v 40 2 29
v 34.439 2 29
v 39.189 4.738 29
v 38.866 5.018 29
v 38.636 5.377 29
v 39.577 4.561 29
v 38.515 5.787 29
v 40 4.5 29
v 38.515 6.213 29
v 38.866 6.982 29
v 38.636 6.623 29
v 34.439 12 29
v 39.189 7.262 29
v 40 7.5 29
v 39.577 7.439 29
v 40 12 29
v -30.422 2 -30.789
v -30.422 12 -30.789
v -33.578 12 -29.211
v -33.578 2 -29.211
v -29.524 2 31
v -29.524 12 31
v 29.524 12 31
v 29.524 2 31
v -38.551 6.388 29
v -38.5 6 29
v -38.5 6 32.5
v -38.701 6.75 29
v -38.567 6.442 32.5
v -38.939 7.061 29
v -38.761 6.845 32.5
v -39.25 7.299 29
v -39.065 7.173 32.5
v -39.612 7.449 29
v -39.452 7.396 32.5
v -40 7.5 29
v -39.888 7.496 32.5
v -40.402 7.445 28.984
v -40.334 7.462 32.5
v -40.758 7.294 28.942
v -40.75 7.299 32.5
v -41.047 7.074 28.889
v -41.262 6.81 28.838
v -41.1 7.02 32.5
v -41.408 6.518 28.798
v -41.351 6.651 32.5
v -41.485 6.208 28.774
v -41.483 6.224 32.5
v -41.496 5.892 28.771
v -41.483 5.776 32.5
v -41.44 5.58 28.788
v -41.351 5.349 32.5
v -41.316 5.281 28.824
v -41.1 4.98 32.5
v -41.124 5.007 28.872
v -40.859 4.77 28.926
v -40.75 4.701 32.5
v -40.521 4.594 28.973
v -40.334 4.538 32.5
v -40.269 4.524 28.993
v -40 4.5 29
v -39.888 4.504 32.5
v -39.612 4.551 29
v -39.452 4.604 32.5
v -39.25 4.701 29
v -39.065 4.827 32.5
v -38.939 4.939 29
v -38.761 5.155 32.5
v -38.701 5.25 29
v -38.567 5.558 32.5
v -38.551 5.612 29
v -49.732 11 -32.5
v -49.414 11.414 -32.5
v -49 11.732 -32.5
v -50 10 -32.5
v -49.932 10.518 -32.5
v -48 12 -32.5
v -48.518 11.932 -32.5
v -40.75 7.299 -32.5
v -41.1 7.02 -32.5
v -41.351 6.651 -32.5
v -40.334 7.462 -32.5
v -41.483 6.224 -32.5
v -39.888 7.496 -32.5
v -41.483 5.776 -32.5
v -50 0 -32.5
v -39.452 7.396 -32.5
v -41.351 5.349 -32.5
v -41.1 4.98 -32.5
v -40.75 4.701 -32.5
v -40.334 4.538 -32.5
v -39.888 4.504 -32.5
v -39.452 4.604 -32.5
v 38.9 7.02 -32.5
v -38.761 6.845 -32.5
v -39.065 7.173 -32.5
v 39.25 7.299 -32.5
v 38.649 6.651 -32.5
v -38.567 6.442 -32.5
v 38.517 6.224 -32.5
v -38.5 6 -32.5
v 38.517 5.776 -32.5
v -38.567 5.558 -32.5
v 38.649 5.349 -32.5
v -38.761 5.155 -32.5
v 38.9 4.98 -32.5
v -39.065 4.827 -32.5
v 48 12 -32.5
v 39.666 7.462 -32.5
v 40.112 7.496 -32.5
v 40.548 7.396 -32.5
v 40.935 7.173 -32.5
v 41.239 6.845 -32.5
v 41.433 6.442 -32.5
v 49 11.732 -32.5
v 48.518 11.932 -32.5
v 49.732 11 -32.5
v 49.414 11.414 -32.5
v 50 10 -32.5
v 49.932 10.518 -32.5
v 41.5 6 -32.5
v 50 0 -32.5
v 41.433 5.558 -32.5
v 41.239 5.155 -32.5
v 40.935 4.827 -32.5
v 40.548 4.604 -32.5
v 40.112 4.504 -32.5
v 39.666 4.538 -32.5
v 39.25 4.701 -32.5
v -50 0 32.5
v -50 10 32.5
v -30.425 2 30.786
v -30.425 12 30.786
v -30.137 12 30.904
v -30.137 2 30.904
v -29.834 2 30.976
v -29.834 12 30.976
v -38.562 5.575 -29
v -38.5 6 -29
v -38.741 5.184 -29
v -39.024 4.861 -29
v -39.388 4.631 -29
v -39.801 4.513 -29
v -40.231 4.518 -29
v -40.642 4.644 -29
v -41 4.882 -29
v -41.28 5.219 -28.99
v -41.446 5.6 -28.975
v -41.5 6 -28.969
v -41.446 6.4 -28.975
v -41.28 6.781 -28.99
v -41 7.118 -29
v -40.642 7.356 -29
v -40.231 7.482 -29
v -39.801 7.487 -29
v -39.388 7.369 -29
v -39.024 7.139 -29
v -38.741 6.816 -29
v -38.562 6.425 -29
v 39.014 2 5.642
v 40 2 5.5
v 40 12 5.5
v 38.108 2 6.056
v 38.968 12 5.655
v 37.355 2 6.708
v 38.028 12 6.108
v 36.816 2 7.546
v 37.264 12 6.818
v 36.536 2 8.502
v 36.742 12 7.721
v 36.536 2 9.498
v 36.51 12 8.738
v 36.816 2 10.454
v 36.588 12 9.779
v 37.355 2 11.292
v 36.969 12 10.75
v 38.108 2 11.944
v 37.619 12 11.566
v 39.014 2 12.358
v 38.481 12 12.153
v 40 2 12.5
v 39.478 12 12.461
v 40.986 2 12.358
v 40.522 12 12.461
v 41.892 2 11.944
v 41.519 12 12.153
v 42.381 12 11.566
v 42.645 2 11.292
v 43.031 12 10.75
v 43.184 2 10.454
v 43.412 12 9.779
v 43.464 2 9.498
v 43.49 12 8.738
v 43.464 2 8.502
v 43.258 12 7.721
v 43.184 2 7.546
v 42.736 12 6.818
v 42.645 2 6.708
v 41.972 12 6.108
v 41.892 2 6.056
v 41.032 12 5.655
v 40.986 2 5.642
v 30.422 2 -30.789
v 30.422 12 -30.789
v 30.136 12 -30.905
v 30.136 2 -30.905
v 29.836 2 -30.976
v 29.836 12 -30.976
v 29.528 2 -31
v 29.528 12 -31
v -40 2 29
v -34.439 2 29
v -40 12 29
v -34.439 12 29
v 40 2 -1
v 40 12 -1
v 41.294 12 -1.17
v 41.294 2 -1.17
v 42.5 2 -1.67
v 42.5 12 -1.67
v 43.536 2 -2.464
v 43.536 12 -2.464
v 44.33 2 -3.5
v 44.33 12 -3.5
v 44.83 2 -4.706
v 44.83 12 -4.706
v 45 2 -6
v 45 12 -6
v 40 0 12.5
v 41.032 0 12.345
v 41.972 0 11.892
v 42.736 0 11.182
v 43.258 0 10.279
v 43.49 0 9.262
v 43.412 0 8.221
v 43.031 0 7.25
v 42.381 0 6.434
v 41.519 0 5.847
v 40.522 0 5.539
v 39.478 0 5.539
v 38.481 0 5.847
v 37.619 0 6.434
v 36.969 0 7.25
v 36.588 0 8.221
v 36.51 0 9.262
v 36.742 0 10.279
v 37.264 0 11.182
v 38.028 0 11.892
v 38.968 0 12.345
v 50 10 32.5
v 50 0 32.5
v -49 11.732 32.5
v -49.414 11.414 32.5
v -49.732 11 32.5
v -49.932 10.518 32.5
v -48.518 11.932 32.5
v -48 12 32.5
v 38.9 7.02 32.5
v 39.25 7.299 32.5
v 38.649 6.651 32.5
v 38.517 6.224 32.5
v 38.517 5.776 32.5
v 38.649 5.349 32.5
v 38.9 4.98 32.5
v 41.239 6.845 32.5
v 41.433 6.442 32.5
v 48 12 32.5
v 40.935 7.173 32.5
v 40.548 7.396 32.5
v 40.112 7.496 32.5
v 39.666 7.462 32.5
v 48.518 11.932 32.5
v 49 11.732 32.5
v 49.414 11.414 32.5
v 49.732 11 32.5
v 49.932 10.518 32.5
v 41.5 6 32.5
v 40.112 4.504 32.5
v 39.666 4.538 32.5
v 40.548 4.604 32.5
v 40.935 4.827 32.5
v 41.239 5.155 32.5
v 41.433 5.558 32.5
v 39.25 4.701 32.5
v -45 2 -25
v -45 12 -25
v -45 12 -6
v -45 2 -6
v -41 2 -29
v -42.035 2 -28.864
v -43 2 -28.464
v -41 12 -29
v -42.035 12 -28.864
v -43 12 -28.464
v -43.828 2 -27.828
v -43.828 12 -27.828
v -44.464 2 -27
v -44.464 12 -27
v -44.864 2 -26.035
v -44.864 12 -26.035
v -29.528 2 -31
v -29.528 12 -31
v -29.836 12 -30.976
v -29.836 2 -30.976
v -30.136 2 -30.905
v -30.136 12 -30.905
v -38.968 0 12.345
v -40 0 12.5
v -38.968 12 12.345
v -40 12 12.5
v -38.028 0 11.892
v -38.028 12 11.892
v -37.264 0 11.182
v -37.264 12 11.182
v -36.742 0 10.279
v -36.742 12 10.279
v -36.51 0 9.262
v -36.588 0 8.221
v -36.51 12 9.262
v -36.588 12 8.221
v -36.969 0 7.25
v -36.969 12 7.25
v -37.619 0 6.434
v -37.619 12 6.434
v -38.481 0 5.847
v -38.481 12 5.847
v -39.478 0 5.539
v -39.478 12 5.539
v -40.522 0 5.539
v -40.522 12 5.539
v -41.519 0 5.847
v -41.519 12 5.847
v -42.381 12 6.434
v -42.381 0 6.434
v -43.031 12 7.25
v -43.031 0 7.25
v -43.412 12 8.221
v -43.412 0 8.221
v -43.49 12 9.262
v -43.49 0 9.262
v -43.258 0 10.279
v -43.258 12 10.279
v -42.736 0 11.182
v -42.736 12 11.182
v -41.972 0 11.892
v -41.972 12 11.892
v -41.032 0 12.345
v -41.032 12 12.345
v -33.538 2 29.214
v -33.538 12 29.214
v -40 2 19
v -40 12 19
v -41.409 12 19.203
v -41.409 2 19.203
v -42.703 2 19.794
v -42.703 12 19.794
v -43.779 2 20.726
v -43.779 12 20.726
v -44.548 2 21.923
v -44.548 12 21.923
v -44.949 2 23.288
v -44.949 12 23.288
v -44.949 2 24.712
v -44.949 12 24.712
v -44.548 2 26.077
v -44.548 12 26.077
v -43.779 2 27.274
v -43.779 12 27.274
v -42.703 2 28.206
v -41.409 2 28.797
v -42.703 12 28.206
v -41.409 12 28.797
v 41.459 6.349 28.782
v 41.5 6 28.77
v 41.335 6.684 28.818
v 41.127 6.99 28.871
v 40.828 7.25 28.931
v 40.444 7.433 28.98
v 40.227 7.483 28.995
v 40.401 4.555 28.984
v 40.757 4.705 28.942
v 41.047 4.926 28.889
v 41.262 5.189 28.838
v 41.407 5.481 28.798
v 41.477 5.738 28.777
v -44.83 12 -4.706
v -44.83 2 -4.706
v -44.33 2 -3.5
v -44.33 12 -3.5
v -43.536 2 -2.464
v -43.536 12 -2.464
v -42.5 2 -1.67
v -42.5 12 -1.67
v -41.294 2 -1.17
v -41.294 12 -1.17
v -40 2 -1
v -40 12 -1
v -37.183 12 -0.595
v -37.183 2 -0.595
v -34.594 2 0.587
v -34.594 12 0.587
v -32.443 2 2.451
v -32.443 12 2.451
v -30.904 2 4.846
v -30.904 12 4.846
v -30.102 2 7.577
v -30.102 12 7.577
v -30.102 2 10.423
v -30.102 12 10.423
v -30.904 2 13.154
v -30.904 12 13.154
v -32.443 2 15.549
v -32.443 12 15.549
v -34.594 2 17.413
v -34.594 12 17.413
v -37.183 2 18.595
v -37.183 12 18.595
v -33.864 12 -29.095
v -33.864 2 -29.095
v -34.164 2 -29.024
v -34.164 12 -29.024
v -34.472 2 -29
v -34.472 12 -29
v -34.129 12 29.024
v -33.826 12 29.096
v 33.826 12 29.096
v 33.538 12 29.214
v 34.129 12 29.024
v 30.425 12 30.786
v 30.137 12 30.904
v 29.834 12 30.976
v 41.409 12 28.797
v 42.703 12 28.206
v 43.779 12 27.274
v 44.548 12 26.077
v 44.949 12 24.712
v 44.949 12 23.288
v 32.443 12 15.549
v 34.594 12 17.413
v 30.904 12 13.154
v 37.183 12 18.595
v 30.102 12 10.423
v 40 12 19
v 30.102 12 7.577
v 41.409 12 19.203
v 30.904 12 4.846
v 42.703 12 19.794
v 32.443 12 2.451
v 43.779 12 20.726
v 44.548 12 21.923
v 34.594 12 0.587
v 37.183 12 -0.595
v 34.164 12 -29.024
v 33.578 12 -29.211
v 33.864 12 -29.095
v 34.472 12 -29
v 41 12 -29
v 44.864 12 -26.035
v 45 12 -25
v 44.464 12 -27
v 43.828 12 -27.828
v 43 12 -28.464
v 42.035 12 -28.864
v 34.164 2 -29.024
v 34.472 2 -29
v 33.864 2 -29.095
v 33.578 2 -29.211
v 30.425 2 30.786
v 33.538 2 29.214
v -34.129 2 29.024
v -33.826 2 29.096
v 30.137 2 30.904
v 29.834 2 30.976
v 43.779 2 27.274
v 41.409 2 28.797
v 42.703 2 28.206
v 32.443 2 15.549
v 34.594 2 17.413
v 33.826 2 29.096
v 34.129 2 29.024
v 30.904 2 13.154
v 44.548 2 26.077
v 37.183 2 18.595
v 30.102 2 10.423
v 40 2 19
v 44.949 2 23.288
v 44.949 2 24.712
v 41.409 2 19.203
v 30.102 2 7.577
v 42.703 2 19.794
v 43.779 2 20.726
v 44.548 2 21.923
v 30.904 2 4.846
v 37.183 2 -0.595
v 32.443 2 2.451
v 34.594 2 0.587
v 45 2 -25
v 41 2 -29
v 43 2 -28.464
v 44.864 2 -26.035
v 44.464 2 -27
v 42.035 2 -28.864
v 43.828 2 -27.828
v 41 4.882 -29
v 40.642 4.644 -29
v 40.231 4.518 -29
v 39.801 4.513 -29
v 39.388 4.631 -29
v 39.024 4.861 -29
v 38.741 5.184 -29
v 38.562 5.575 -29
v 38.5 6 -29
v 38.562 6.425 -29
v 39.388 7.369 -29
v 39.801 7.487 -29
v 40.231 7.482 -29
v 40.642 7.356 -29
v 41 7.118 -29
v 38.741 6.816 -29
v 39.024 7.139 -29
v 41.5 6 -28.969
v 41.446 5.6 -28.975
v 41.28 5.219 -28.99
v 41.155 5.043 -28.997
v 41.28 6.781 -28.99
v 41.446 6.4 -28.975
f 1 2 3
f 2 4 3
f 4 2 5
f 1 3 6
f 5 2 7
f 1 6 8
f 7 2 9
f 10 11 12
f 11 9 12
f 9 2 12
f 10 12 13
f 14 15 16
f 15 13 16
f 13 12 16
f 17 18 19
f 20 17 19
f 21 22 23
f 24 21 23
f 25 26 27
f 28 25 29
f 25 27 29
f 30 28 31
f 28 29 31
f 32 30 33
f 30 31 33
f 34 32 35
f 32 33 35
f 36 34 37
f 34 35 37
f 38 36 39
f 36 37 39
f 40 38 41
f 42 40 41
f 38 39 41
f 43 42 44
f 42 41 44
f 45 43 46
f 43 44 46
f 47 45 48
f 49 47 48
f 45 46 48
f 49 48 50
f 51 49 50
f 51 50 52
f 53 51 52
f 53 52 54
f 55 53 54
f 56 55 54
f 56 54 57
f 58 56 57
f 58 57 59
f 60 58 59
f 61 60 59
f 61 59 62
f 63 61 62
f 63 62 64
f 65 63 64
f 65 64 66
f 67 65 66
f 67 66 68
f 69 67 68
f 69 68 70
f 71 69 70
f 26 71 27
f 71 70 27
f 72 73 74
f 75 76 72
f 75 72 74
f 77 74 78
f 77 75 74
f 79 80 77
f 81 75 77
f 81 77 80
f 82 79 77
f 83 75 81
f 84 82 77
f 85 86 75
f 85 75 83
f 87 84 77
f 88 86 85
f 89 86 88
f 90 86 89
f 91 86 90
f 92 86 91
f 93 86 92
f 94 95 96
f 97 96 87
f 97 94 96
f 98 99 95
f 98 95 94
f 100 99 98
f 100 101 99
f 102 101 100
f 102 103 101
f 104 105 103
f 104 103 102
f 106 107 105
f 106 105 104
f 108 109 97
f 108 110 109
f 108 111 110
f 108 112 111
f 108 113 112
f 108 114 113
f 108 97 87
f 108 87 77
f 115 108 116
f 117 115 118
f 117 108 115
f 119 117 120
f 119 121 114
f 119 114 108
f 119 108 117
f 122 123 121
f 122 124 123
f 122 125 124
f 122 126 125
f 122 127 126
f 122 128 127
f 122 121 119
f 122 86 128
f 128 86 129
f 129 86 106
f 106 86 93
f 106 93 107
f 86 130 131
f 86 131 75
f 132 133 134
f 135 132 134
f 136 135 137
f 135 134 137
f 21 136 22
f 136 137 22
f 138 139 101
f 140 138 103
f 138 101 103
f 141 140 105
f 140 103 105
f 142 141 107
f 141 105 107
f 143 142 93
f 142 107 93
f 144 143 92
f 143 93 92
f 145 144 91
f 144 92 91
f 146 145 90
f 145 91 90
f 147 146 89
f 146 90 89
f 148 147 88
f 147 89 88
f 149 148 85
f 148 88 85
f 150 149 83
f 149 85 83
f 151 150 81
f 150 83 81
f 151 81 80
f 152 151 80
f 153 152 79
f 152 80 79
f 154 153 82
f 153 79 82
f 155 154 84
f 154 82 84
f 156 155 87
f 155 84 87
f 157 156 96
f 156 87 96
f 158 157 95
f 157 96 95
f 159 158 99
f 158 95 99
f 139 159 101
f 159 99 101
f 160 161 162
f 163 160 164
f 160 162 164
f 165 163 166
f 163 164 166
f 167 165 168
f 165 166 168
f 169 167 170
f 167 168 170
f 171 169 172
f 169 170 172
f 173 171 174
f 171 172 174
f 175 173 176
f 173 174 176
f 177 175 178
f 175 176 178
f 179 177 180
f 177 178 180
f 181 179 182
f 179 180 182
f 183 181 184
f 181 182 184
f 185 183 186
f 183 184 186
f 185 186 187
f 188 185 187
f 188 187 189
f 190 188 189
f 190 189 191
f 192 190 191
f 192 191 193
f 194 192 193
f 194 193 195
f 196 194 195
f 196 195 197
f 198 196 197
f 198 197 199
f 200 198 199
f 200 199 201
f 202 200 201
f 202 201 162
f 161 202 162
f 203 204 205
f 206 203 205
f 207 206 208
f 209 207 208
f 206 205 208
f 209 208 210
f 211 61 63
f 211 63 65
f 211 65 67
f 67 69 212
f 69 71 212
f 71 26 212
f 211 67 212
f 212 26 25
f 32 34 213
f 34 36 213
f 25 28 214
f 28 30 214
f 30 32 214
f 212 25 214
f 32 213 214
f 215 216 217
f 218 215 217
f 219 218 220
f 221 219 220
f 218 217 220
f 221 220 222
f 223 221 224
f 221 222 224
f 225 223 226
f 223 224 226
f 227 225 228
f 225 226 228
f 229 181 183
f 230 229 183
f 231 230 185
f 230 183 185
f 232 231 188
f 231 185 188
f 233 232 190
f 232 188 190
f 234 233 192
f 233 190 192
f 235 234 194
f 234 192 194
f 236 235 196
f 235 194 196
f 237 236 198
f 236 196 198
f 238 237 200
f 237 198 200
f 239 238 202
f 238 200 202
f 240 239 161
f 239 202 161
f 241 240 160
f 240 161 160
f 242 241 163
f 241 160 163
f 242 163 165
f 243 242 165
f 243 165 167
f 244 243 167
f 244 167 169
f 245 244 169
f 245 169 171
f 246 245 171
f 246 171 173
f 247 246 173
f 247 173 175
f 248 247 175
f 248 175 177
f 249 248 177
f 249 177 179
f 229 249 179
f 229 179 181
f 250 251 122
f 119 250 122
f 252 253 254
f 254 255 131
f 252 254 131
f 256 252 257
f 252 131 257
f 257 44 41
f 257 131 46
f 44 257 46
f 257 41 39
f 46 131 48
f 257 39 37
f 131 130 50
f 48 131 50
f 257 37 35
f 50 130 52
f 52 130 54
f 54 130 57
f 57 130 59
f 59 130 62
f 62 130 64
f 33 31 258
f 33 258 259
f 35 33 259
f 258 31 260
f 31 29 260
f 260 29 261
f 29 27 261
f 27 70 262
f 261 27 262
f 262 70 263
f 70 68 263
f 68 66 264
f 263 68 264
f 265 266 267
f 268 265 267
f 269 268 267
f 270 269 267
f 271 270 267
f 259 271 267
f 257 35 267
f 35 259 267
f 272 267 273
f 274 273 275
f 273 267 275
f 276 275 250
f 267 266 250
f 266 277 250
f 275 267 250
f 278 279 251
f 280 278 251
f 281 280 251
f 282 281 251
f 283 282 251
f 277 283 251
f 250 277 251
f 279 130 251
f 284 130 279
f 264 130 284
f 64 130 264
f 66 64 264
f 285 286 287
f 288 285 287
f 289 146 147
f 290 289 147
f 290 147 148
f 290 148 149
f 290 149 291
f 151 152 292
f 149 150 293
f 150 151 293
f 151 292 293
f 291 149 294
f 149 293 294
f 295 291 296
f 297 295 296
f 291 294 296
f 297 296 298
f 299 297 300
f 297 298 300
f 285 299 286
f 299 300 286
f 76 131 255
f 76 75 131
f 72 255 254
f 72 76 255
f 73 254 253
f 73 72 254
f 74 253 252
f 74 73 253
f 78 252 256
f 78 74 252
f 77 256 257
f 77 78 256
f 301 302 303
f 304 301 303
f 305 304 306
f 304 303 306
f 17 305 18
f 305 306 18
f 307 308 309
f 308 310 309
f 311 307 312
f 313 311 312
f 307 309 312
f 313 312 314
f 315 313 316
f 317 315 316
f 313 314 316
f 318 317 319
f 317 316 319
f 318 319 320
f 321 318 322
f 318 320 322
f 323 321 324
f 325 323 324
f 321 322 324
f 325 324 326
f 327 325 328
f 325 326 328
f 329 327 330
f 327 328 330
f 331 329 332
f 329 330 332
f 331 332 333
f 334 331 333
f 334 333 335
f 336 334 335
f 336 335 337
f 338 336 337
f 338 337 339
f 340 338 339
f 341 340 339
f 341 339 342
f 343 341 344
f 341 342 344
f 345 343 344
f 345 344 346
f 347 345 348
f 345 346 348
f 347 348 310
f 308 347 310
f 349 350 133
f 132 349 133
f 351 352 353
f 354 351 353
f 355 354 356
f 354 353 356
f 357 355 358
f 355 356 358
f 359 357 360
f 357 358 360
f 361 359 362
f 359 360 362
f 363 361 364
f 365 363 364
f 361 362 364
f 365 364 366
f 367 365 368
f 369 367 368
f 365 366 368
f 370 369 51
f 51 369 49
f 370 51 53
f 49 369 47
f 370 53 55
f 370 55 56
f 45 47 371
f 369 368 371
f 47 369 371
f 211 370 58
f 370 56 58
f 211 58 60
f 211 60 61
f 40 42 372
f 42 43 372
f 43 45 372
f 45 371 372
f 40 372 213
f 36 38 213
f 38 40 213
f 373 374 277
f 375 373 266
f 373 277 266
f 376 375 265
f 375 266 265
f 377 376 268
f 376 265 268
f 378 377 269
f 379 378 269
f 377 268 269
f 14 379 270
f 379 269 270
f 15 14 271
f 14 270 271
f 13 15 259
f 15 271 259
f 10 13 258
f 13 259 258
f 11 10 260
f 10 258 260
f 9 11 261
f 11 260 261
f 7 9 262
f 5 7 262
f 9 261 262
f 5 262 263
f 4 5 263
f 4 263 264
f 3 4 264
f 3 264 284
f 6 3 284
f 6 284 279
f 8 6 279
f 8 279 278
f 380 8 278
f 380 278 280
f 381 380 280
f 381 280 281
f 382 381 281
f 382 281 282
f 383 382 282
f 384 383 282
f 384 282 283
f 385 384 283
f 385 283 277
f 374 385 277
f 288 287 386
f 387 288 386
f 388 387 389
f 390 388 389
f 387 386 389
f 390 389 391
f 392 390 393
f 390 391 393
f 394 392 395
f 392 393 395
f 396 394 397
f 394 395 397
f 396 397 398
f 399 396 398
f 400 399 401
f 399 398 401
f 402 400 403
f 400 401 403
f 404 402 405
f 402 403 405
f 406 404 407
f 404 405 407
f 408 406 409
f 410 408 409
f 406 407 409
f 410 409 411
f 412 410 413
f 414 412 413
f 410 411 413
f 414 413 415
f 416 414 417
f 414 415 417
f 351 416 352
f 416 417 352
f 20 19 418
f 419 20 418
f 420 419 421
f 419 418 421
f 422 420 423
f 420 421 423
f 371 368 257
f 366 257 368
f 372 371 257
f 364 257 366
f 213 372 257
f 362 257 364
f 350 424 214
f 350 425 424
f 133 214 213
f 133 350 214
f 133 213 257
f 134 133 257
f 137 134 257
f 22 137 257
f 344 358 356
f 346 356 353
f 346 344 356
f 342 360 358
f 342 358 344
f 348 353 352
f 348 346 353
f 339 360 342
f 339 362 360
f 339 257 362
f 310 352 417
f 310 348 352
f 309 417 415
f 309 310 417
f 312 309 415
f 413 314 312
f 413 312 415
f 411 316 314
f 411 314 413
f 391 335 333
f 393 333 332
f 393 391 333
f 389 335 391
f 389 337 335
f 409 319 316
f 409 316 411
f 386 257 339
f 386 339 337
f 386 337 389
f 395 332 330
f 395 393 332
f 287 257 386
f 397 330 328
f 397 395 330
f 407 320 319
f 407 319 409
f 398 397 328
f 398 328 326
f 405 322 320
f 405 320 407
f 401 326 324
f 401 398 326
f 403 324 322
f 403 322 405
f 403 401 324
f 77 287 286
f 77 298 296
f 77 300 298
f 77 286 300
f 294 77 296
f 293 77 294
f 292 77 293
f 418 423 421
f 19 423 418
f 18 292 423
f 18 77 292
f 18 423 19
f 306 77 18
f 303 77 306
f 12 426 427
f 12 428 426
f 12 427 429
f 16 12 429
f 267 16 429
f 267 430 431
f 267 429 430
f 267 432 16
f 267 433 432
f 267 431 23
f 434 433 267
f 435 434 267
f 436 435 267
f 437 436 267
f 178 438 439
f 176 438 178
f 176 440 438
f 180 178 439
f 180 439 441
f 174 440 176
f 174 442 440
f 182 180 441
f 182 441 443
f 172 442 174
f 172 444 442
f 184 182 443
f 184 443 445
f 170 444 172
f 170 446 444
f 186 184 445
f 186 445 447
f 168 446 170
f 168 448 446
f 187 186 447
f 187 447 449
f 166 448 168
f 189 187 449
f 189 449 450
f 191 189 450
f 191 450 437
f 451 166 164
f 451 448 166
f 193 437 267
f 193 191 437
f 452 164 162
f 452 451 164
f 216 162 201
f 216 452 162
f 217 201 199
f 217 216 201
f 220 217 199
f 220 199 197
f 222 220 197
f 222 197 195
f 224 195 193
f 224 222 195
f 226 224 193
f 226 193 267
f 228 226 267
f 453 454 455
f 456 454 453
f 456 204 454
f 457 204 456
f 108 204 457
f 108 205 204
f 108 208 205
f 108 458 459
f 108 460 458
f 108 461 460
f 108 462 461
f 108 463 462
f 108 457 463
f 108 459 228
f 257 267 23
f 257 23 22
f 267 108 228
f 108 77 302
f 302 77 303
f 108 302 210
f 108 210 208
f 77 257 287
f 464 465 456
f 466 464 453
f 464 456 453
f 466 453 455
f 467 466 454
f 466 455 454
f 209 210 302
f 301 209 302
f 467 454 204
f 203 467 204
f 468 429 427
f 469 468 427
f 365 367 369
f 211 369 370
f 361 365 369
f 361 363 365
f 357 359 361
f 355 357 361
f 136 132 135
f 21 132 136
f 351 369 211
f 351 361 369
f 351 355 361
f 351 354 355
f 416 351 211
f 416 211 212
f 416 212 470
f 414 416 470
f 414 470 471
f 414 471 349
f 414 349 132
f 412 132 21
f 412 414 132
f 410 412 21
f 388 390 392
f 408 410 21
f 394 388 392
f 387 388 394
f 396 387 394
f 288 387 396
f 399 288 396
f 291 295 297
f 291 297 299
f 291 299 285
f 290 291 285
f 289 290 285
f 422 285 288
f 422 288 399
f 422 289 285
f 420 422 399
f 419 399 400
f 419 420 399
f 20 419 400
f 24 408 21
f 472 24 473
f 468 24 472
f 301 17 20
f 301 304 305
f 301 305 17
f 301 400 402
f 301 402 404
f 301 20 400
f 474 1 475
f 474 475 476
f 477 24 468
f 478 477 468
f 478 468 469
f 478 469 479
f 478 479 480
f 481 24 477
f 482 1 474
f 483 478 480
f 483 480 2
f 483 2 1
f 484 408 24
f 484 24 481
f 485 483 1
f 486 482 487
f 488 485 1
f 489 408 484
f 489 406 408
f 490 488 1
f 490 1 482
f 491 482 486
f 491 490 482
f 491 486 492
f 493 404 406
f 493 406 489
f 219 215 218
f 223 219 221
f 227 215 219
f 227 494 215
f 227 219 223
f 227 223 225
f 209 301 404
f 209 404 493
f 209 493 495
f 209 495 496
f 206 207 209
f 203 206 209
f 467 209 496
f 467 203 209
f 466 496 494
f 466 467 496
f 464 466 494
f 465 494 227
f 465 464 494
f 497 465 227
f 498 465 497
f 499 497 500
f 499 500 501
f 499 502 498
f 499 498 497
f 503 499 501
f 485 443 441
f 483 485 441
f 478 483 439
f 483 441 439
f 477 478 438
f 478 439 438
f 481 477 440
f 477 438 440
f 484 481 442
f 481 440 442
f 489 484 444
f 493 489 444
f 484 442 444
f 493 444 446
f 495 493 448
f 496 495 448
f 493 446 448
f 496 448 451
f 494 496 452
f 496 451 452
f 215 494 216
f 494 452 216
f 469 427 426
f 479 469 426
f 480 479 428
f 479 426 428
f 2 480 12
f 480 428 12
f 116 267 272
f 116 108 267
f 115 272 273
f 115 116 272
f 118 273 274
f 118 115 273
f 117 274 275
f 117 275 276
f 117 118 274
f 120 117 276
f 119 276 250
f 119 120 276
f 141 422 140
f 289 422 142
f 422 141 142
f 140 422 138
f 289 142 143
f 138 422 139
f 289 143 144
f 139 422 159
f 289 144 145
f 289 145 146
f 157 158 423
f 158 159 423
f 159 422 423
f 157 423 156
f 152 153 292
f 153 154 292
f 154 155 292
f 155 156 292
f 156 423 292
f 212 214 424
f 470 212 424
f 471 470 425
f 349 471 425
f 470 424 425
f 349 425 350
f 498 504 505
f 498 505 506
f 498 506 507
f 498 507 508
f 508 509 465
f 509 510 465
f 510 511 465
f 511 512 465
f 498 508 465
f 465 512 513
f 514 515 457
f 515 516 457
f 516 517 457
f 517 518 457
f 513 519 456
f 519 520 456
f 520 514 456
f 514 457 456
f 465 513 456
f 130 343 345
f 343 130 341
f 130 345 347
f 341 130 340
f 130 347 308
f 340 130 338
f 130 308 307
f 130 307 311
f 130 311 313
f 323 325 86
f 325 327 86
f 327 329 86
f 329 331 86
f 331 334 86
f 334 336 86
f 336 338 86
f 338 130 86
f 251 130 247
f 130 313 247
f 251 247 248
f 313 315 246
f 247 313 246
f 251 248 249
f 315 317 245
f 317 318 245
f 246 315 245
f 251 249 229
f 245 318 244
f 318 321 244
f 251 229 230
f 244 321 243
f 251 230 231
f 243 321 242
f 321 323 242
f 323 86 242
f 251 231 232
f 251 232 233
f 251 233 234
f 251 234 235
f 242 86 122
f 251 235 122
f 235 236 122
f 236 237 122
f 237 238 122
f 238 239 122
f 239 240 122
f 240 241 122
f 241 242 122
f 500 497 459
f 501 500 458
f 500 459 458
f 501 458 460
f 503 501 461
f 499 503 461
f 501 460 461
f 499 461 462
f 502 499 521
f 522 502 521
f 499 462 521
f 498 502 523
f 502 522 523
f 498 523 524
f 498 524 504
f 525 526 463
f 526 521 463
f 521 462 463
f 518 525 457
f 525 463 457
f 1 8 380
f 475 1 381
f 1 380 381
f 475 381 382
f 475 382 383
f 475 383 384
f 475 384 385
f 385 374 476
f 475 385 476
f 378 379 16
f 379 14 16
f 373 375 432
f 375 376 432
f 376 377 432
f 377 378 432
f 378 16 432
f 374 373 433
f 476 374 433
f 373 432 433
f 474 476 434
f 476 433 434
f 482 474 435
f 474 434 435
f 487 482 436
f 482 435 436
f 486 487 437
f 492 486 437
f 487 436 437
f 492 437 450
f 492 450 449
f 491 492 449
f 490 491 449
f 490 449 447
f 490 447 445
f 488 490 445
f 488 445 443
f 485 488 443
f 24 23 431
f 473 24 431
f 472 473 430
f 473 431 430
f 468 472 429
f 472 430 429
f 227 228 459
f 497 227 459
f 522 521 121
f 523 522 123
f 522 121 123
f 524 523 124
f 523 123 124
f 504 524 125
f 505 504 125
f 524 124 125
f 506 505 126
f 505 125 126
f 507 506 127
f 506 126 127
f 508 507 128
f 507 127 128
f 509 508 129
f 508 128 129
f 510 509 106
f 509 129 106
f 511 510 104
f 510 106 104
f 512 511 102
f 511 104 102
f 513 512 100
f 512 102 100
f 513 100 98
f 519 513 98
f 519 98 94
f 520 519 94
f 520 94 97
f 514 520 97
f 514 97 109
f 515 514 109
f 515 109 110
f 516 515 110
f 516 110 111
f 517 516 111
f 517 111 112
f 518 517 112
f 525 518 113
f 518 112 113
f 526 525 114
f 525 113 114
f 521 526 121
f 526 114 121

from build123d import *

# Parameters (mm, degrees)
SKETCH_1_W          = 100
SKETCH_1_H          = 65
EXTRUDE_1_DEPTH     = 12
SKETCH_2_R          = 3.5
CUT_EXTRUDE_2_DEPTH = 10
SKETCH_3_R          = 3.5
CUT_EXTRUDE_3_DEPTH = 61.466933112
SKETCH_4_R          = 3.5
CUT_EXTRUDE_4_DEPTH = 61.466933112
CUT_EXTRUDE_5_REACH = 84.879
SKETCH_5_R          = 1.5
CUT_EXTRUDE_6_REACH = 84.879
SKETCH_6_R          = 1.5
FILLET_3_R          = 2


with BuildPart() as part:
    # 草图1 → 凸台-拉伸1 (new body)
    with BuildSketch(Plane(origin=(0, 0, 0), x_dir=(1, 0, 0), z_dir=(0, 1, 0))):
        Rectangle(SKETCH_1_W, SKETCH_1_H)
    extrude(amount=EXTRUDE_1_DEPTH)

    # 草图2 → 切除-拉伸2 (cut)
    with BuildSketch(Plane(origin=(0, 12, 0), x_dir=(1, 0, 0), z_dir=(0, 1, 0))):
        with Locations(Location((-40, -9, 0), (0, 0, 270))):
            Circle(SKETCH_2_R)
        with Locations(Location((40, -9, 0), (0, 0, 90))):
            Circle(SKETCH_2_R)
        with BuildLine():
            Line((-30.422291236, 30.788854382), (-33.577708764, 29.211145618))
            ThreePointArc((-33.577708764, 29.211145618), (-34.012630114, 29.053502021), (-34.472135955, 29))
            Line((-34.472135955, 29), (-41, 29))
            ThreePointArc((-41, 29), (-43.828427125, 27.828427125), (-45, 25))
            Line((-45, 25), (-45, 6))
            ThreePointArc((-45, 6), (-43.535533906, 2.464466094), (-40, 1))
            ThreePointArc((-40, 1), (-30, -9), (-40, -19))
            ThreePointArc((-40, -19), (-45, -24), (-40, -29))
            Line((-40, -29), (-34.439229319, -29))
            ThreePointArc((-34.439229319, -29), (-33.976113717, -29.054357705), (-33.538172016, -29.214476061))
            Line((-33.538172016, -29.214476061), (-30.425003094, -30.785523939))
            ThreePointArc((-30.425003094, -30.785523939), (-29.987061393, -30.945642295), (-29.52394579, -31))
            Line((-29.52394579, -31), (29.52394579, -31))
            ThreePointArc((29.52394579, -31), (29.987061393, -30.945642295), (30.425003094, -30.785523939))
            Line((30.425003094, -30.785523939), (33.538172016, -29.214476061))
            ThreePointArc((33.538172016, -29.214476061), (33.976113717, -29.054357705), (34.439229319, -29))
            Line((34.439229319, -29), (40, -29))
            ThreePointArc((40, -29), (45, -24), (40, -19))
            ThreePointArc((40, -19), (30, -9), (40, 1))
            ThreePointArc((40, 1), (43.535533906, 2.464466094), (45, 6))
            Line((45, 6), (45, 25))
            ThreePointArc((45, 25), (43.828427125, 27.828427125), (41, 29))
            Line((41, 29), (34.472135955, 29))
            ThreePointArc((34.472135955, 29), (34.012630114, 29.053502021), (33.577708764, 29.211145618))
            Line((33.577708764, 29.211145618), (30.422291236, 30.788854382))
            ThreePointArc((30.422291236, 30.788854382), (29.987369886, 30.946497979), (29.527864045, 31))
            Line((29.527864045, 31), (-29.527864045, 31))
            ThreePointArc((-29.527864045, 31), (-29.987369886, 30.946497979), (-30.422291236, 30.788854382))
        make_face()
    extrude(amount=-CUT_EXTRUDE_2_DEPTH, mode=Mode.SUBTRACT)

    # 草图3 → 切除-拉伸3 (cut, through all)
    with BuildSketch(Plane(origin=(0, 2, 0), x_dir=(1, 0, 0), z_dir=(0, 1, 0))):
        with Locations(Location((-40, -9, 0), (0, 0, 270))):
            Circle(SKETCH_3_R)
    extrude(amount=-CUT_EXTRUDE_3_DEPTH, mode=Mode.SUBTRACT)

    # 草图4 → 切除-拉伸4 (cut, through all)
    with BuildSketch(Plane(origin=(0, 2, 0), x_dir=(1, 0, 0), z_dir=(0, 1, 0))):
        with Locations(Location((40, -9, 0), (0, 0, 270))):
            Circle(SKETCH_4_R)
    extrude(amount=-CUT_EXTRUDE_4_DEPTH, mode=Mode.SUBTRACT)

    # 草图5 → 切除-拉伸5 (cut, up to next)
    with BuildSketch(Plane.XY.offset(32.5), mode=Mode.PRIVATE) as cut_extrude_5_sk1:
        with Locations((-40, 6)):
            Circle(SKETCH_5_R)
    cut_extrude_5_tool1 = extrude(cut_extrude_5_sk1.sketch, amount=-CUT_EXTRUDE_5_REACH, mode=Mode.PRIVATE) & part.part
    # 草图5 → 切除-拉伸5 (cut, up to next)
    with BuildSketch(Plane.XY.offset(32.5), mode=Mode.PRIVATE) as cut_extrude_5_sk2:
        with Locations((40, 6)):
            Circle(SKETCH_5_R)
    cut_extrude_5_tool2 = extrude(cut_extrude_5_sk2.sketch, amount=-CUT_EXTRUDE_5_REACH, mode=Mode.PRIVATE) & part.part
    add(cut_extrude_5_tool1.solids().sort_by_distance((-40, 6, 32.5))[0], mode=Mode.SUBTRACT)
    add(cut_extrude_5_tool2.solids().sort_by_distance((40, 6, 32.5))[0], mode=Mode.SUBTRACT)

    # 草图6 → 切除-拉伸6 (cut, up to next)
    with BuildSketch(Plane(origin=(0, 0, -32.5), x_dir=(-1, 0, 0), z_dir=(0, 0, -1)), mode=Mode.PRIVATE) as cut_extrude_6_sk1:
        with Locations(Location((-40, 6, 0), (0, 0, 180))):
            Circle(SKETCH_6_R)
    cut_extrude_6_tool1 = extrude(cut_extrude_6_sk1.sketch, amount=-CUT_EXTRUDE_6_REACH, mode=Mode.PRIVATE) & part.part
    # 草图6 → 切除-拉伸6 (cut, up to next)
    with BuildSketch(Plane(origin=(0, 0, -32.5), x_dir=(-1, 0, 0), z_dir=(0, 0, -1)), mode=Mode.PRIVATE) as cut_extrude_6_sk2:
        with Locations(Location((40, 6, 0), (0, 0, 180))):
            Circle(SKETCH_6_R)
    cut_extrude_6_tool2 = extrude(cut_extrude_6_sk2.sketch, amount=-CUT_EXTRUDE_6_REACH, mode=Mode.PRIVATE) & part.part
    add(cut_extrude_6_tool1.solids().sort_by_distance((40, 6, -32.5))[0], mode=Mode.SUBTRACT)
    add(cut_extrude_6_tool2.solids().sort_by_distance((-40, 6, -32.5))[0], mode=Mode.SUBTRACT)

    # 圆角3
    fillet_3_edges = [part.edges().sort_by_distance(p)[0] for p in [
        (-50, 12, 0),
        (50, 12, 0),
    ]]
    fillet(fillet_3_edges, radius=FILLET_3_R)


solid = part.part
